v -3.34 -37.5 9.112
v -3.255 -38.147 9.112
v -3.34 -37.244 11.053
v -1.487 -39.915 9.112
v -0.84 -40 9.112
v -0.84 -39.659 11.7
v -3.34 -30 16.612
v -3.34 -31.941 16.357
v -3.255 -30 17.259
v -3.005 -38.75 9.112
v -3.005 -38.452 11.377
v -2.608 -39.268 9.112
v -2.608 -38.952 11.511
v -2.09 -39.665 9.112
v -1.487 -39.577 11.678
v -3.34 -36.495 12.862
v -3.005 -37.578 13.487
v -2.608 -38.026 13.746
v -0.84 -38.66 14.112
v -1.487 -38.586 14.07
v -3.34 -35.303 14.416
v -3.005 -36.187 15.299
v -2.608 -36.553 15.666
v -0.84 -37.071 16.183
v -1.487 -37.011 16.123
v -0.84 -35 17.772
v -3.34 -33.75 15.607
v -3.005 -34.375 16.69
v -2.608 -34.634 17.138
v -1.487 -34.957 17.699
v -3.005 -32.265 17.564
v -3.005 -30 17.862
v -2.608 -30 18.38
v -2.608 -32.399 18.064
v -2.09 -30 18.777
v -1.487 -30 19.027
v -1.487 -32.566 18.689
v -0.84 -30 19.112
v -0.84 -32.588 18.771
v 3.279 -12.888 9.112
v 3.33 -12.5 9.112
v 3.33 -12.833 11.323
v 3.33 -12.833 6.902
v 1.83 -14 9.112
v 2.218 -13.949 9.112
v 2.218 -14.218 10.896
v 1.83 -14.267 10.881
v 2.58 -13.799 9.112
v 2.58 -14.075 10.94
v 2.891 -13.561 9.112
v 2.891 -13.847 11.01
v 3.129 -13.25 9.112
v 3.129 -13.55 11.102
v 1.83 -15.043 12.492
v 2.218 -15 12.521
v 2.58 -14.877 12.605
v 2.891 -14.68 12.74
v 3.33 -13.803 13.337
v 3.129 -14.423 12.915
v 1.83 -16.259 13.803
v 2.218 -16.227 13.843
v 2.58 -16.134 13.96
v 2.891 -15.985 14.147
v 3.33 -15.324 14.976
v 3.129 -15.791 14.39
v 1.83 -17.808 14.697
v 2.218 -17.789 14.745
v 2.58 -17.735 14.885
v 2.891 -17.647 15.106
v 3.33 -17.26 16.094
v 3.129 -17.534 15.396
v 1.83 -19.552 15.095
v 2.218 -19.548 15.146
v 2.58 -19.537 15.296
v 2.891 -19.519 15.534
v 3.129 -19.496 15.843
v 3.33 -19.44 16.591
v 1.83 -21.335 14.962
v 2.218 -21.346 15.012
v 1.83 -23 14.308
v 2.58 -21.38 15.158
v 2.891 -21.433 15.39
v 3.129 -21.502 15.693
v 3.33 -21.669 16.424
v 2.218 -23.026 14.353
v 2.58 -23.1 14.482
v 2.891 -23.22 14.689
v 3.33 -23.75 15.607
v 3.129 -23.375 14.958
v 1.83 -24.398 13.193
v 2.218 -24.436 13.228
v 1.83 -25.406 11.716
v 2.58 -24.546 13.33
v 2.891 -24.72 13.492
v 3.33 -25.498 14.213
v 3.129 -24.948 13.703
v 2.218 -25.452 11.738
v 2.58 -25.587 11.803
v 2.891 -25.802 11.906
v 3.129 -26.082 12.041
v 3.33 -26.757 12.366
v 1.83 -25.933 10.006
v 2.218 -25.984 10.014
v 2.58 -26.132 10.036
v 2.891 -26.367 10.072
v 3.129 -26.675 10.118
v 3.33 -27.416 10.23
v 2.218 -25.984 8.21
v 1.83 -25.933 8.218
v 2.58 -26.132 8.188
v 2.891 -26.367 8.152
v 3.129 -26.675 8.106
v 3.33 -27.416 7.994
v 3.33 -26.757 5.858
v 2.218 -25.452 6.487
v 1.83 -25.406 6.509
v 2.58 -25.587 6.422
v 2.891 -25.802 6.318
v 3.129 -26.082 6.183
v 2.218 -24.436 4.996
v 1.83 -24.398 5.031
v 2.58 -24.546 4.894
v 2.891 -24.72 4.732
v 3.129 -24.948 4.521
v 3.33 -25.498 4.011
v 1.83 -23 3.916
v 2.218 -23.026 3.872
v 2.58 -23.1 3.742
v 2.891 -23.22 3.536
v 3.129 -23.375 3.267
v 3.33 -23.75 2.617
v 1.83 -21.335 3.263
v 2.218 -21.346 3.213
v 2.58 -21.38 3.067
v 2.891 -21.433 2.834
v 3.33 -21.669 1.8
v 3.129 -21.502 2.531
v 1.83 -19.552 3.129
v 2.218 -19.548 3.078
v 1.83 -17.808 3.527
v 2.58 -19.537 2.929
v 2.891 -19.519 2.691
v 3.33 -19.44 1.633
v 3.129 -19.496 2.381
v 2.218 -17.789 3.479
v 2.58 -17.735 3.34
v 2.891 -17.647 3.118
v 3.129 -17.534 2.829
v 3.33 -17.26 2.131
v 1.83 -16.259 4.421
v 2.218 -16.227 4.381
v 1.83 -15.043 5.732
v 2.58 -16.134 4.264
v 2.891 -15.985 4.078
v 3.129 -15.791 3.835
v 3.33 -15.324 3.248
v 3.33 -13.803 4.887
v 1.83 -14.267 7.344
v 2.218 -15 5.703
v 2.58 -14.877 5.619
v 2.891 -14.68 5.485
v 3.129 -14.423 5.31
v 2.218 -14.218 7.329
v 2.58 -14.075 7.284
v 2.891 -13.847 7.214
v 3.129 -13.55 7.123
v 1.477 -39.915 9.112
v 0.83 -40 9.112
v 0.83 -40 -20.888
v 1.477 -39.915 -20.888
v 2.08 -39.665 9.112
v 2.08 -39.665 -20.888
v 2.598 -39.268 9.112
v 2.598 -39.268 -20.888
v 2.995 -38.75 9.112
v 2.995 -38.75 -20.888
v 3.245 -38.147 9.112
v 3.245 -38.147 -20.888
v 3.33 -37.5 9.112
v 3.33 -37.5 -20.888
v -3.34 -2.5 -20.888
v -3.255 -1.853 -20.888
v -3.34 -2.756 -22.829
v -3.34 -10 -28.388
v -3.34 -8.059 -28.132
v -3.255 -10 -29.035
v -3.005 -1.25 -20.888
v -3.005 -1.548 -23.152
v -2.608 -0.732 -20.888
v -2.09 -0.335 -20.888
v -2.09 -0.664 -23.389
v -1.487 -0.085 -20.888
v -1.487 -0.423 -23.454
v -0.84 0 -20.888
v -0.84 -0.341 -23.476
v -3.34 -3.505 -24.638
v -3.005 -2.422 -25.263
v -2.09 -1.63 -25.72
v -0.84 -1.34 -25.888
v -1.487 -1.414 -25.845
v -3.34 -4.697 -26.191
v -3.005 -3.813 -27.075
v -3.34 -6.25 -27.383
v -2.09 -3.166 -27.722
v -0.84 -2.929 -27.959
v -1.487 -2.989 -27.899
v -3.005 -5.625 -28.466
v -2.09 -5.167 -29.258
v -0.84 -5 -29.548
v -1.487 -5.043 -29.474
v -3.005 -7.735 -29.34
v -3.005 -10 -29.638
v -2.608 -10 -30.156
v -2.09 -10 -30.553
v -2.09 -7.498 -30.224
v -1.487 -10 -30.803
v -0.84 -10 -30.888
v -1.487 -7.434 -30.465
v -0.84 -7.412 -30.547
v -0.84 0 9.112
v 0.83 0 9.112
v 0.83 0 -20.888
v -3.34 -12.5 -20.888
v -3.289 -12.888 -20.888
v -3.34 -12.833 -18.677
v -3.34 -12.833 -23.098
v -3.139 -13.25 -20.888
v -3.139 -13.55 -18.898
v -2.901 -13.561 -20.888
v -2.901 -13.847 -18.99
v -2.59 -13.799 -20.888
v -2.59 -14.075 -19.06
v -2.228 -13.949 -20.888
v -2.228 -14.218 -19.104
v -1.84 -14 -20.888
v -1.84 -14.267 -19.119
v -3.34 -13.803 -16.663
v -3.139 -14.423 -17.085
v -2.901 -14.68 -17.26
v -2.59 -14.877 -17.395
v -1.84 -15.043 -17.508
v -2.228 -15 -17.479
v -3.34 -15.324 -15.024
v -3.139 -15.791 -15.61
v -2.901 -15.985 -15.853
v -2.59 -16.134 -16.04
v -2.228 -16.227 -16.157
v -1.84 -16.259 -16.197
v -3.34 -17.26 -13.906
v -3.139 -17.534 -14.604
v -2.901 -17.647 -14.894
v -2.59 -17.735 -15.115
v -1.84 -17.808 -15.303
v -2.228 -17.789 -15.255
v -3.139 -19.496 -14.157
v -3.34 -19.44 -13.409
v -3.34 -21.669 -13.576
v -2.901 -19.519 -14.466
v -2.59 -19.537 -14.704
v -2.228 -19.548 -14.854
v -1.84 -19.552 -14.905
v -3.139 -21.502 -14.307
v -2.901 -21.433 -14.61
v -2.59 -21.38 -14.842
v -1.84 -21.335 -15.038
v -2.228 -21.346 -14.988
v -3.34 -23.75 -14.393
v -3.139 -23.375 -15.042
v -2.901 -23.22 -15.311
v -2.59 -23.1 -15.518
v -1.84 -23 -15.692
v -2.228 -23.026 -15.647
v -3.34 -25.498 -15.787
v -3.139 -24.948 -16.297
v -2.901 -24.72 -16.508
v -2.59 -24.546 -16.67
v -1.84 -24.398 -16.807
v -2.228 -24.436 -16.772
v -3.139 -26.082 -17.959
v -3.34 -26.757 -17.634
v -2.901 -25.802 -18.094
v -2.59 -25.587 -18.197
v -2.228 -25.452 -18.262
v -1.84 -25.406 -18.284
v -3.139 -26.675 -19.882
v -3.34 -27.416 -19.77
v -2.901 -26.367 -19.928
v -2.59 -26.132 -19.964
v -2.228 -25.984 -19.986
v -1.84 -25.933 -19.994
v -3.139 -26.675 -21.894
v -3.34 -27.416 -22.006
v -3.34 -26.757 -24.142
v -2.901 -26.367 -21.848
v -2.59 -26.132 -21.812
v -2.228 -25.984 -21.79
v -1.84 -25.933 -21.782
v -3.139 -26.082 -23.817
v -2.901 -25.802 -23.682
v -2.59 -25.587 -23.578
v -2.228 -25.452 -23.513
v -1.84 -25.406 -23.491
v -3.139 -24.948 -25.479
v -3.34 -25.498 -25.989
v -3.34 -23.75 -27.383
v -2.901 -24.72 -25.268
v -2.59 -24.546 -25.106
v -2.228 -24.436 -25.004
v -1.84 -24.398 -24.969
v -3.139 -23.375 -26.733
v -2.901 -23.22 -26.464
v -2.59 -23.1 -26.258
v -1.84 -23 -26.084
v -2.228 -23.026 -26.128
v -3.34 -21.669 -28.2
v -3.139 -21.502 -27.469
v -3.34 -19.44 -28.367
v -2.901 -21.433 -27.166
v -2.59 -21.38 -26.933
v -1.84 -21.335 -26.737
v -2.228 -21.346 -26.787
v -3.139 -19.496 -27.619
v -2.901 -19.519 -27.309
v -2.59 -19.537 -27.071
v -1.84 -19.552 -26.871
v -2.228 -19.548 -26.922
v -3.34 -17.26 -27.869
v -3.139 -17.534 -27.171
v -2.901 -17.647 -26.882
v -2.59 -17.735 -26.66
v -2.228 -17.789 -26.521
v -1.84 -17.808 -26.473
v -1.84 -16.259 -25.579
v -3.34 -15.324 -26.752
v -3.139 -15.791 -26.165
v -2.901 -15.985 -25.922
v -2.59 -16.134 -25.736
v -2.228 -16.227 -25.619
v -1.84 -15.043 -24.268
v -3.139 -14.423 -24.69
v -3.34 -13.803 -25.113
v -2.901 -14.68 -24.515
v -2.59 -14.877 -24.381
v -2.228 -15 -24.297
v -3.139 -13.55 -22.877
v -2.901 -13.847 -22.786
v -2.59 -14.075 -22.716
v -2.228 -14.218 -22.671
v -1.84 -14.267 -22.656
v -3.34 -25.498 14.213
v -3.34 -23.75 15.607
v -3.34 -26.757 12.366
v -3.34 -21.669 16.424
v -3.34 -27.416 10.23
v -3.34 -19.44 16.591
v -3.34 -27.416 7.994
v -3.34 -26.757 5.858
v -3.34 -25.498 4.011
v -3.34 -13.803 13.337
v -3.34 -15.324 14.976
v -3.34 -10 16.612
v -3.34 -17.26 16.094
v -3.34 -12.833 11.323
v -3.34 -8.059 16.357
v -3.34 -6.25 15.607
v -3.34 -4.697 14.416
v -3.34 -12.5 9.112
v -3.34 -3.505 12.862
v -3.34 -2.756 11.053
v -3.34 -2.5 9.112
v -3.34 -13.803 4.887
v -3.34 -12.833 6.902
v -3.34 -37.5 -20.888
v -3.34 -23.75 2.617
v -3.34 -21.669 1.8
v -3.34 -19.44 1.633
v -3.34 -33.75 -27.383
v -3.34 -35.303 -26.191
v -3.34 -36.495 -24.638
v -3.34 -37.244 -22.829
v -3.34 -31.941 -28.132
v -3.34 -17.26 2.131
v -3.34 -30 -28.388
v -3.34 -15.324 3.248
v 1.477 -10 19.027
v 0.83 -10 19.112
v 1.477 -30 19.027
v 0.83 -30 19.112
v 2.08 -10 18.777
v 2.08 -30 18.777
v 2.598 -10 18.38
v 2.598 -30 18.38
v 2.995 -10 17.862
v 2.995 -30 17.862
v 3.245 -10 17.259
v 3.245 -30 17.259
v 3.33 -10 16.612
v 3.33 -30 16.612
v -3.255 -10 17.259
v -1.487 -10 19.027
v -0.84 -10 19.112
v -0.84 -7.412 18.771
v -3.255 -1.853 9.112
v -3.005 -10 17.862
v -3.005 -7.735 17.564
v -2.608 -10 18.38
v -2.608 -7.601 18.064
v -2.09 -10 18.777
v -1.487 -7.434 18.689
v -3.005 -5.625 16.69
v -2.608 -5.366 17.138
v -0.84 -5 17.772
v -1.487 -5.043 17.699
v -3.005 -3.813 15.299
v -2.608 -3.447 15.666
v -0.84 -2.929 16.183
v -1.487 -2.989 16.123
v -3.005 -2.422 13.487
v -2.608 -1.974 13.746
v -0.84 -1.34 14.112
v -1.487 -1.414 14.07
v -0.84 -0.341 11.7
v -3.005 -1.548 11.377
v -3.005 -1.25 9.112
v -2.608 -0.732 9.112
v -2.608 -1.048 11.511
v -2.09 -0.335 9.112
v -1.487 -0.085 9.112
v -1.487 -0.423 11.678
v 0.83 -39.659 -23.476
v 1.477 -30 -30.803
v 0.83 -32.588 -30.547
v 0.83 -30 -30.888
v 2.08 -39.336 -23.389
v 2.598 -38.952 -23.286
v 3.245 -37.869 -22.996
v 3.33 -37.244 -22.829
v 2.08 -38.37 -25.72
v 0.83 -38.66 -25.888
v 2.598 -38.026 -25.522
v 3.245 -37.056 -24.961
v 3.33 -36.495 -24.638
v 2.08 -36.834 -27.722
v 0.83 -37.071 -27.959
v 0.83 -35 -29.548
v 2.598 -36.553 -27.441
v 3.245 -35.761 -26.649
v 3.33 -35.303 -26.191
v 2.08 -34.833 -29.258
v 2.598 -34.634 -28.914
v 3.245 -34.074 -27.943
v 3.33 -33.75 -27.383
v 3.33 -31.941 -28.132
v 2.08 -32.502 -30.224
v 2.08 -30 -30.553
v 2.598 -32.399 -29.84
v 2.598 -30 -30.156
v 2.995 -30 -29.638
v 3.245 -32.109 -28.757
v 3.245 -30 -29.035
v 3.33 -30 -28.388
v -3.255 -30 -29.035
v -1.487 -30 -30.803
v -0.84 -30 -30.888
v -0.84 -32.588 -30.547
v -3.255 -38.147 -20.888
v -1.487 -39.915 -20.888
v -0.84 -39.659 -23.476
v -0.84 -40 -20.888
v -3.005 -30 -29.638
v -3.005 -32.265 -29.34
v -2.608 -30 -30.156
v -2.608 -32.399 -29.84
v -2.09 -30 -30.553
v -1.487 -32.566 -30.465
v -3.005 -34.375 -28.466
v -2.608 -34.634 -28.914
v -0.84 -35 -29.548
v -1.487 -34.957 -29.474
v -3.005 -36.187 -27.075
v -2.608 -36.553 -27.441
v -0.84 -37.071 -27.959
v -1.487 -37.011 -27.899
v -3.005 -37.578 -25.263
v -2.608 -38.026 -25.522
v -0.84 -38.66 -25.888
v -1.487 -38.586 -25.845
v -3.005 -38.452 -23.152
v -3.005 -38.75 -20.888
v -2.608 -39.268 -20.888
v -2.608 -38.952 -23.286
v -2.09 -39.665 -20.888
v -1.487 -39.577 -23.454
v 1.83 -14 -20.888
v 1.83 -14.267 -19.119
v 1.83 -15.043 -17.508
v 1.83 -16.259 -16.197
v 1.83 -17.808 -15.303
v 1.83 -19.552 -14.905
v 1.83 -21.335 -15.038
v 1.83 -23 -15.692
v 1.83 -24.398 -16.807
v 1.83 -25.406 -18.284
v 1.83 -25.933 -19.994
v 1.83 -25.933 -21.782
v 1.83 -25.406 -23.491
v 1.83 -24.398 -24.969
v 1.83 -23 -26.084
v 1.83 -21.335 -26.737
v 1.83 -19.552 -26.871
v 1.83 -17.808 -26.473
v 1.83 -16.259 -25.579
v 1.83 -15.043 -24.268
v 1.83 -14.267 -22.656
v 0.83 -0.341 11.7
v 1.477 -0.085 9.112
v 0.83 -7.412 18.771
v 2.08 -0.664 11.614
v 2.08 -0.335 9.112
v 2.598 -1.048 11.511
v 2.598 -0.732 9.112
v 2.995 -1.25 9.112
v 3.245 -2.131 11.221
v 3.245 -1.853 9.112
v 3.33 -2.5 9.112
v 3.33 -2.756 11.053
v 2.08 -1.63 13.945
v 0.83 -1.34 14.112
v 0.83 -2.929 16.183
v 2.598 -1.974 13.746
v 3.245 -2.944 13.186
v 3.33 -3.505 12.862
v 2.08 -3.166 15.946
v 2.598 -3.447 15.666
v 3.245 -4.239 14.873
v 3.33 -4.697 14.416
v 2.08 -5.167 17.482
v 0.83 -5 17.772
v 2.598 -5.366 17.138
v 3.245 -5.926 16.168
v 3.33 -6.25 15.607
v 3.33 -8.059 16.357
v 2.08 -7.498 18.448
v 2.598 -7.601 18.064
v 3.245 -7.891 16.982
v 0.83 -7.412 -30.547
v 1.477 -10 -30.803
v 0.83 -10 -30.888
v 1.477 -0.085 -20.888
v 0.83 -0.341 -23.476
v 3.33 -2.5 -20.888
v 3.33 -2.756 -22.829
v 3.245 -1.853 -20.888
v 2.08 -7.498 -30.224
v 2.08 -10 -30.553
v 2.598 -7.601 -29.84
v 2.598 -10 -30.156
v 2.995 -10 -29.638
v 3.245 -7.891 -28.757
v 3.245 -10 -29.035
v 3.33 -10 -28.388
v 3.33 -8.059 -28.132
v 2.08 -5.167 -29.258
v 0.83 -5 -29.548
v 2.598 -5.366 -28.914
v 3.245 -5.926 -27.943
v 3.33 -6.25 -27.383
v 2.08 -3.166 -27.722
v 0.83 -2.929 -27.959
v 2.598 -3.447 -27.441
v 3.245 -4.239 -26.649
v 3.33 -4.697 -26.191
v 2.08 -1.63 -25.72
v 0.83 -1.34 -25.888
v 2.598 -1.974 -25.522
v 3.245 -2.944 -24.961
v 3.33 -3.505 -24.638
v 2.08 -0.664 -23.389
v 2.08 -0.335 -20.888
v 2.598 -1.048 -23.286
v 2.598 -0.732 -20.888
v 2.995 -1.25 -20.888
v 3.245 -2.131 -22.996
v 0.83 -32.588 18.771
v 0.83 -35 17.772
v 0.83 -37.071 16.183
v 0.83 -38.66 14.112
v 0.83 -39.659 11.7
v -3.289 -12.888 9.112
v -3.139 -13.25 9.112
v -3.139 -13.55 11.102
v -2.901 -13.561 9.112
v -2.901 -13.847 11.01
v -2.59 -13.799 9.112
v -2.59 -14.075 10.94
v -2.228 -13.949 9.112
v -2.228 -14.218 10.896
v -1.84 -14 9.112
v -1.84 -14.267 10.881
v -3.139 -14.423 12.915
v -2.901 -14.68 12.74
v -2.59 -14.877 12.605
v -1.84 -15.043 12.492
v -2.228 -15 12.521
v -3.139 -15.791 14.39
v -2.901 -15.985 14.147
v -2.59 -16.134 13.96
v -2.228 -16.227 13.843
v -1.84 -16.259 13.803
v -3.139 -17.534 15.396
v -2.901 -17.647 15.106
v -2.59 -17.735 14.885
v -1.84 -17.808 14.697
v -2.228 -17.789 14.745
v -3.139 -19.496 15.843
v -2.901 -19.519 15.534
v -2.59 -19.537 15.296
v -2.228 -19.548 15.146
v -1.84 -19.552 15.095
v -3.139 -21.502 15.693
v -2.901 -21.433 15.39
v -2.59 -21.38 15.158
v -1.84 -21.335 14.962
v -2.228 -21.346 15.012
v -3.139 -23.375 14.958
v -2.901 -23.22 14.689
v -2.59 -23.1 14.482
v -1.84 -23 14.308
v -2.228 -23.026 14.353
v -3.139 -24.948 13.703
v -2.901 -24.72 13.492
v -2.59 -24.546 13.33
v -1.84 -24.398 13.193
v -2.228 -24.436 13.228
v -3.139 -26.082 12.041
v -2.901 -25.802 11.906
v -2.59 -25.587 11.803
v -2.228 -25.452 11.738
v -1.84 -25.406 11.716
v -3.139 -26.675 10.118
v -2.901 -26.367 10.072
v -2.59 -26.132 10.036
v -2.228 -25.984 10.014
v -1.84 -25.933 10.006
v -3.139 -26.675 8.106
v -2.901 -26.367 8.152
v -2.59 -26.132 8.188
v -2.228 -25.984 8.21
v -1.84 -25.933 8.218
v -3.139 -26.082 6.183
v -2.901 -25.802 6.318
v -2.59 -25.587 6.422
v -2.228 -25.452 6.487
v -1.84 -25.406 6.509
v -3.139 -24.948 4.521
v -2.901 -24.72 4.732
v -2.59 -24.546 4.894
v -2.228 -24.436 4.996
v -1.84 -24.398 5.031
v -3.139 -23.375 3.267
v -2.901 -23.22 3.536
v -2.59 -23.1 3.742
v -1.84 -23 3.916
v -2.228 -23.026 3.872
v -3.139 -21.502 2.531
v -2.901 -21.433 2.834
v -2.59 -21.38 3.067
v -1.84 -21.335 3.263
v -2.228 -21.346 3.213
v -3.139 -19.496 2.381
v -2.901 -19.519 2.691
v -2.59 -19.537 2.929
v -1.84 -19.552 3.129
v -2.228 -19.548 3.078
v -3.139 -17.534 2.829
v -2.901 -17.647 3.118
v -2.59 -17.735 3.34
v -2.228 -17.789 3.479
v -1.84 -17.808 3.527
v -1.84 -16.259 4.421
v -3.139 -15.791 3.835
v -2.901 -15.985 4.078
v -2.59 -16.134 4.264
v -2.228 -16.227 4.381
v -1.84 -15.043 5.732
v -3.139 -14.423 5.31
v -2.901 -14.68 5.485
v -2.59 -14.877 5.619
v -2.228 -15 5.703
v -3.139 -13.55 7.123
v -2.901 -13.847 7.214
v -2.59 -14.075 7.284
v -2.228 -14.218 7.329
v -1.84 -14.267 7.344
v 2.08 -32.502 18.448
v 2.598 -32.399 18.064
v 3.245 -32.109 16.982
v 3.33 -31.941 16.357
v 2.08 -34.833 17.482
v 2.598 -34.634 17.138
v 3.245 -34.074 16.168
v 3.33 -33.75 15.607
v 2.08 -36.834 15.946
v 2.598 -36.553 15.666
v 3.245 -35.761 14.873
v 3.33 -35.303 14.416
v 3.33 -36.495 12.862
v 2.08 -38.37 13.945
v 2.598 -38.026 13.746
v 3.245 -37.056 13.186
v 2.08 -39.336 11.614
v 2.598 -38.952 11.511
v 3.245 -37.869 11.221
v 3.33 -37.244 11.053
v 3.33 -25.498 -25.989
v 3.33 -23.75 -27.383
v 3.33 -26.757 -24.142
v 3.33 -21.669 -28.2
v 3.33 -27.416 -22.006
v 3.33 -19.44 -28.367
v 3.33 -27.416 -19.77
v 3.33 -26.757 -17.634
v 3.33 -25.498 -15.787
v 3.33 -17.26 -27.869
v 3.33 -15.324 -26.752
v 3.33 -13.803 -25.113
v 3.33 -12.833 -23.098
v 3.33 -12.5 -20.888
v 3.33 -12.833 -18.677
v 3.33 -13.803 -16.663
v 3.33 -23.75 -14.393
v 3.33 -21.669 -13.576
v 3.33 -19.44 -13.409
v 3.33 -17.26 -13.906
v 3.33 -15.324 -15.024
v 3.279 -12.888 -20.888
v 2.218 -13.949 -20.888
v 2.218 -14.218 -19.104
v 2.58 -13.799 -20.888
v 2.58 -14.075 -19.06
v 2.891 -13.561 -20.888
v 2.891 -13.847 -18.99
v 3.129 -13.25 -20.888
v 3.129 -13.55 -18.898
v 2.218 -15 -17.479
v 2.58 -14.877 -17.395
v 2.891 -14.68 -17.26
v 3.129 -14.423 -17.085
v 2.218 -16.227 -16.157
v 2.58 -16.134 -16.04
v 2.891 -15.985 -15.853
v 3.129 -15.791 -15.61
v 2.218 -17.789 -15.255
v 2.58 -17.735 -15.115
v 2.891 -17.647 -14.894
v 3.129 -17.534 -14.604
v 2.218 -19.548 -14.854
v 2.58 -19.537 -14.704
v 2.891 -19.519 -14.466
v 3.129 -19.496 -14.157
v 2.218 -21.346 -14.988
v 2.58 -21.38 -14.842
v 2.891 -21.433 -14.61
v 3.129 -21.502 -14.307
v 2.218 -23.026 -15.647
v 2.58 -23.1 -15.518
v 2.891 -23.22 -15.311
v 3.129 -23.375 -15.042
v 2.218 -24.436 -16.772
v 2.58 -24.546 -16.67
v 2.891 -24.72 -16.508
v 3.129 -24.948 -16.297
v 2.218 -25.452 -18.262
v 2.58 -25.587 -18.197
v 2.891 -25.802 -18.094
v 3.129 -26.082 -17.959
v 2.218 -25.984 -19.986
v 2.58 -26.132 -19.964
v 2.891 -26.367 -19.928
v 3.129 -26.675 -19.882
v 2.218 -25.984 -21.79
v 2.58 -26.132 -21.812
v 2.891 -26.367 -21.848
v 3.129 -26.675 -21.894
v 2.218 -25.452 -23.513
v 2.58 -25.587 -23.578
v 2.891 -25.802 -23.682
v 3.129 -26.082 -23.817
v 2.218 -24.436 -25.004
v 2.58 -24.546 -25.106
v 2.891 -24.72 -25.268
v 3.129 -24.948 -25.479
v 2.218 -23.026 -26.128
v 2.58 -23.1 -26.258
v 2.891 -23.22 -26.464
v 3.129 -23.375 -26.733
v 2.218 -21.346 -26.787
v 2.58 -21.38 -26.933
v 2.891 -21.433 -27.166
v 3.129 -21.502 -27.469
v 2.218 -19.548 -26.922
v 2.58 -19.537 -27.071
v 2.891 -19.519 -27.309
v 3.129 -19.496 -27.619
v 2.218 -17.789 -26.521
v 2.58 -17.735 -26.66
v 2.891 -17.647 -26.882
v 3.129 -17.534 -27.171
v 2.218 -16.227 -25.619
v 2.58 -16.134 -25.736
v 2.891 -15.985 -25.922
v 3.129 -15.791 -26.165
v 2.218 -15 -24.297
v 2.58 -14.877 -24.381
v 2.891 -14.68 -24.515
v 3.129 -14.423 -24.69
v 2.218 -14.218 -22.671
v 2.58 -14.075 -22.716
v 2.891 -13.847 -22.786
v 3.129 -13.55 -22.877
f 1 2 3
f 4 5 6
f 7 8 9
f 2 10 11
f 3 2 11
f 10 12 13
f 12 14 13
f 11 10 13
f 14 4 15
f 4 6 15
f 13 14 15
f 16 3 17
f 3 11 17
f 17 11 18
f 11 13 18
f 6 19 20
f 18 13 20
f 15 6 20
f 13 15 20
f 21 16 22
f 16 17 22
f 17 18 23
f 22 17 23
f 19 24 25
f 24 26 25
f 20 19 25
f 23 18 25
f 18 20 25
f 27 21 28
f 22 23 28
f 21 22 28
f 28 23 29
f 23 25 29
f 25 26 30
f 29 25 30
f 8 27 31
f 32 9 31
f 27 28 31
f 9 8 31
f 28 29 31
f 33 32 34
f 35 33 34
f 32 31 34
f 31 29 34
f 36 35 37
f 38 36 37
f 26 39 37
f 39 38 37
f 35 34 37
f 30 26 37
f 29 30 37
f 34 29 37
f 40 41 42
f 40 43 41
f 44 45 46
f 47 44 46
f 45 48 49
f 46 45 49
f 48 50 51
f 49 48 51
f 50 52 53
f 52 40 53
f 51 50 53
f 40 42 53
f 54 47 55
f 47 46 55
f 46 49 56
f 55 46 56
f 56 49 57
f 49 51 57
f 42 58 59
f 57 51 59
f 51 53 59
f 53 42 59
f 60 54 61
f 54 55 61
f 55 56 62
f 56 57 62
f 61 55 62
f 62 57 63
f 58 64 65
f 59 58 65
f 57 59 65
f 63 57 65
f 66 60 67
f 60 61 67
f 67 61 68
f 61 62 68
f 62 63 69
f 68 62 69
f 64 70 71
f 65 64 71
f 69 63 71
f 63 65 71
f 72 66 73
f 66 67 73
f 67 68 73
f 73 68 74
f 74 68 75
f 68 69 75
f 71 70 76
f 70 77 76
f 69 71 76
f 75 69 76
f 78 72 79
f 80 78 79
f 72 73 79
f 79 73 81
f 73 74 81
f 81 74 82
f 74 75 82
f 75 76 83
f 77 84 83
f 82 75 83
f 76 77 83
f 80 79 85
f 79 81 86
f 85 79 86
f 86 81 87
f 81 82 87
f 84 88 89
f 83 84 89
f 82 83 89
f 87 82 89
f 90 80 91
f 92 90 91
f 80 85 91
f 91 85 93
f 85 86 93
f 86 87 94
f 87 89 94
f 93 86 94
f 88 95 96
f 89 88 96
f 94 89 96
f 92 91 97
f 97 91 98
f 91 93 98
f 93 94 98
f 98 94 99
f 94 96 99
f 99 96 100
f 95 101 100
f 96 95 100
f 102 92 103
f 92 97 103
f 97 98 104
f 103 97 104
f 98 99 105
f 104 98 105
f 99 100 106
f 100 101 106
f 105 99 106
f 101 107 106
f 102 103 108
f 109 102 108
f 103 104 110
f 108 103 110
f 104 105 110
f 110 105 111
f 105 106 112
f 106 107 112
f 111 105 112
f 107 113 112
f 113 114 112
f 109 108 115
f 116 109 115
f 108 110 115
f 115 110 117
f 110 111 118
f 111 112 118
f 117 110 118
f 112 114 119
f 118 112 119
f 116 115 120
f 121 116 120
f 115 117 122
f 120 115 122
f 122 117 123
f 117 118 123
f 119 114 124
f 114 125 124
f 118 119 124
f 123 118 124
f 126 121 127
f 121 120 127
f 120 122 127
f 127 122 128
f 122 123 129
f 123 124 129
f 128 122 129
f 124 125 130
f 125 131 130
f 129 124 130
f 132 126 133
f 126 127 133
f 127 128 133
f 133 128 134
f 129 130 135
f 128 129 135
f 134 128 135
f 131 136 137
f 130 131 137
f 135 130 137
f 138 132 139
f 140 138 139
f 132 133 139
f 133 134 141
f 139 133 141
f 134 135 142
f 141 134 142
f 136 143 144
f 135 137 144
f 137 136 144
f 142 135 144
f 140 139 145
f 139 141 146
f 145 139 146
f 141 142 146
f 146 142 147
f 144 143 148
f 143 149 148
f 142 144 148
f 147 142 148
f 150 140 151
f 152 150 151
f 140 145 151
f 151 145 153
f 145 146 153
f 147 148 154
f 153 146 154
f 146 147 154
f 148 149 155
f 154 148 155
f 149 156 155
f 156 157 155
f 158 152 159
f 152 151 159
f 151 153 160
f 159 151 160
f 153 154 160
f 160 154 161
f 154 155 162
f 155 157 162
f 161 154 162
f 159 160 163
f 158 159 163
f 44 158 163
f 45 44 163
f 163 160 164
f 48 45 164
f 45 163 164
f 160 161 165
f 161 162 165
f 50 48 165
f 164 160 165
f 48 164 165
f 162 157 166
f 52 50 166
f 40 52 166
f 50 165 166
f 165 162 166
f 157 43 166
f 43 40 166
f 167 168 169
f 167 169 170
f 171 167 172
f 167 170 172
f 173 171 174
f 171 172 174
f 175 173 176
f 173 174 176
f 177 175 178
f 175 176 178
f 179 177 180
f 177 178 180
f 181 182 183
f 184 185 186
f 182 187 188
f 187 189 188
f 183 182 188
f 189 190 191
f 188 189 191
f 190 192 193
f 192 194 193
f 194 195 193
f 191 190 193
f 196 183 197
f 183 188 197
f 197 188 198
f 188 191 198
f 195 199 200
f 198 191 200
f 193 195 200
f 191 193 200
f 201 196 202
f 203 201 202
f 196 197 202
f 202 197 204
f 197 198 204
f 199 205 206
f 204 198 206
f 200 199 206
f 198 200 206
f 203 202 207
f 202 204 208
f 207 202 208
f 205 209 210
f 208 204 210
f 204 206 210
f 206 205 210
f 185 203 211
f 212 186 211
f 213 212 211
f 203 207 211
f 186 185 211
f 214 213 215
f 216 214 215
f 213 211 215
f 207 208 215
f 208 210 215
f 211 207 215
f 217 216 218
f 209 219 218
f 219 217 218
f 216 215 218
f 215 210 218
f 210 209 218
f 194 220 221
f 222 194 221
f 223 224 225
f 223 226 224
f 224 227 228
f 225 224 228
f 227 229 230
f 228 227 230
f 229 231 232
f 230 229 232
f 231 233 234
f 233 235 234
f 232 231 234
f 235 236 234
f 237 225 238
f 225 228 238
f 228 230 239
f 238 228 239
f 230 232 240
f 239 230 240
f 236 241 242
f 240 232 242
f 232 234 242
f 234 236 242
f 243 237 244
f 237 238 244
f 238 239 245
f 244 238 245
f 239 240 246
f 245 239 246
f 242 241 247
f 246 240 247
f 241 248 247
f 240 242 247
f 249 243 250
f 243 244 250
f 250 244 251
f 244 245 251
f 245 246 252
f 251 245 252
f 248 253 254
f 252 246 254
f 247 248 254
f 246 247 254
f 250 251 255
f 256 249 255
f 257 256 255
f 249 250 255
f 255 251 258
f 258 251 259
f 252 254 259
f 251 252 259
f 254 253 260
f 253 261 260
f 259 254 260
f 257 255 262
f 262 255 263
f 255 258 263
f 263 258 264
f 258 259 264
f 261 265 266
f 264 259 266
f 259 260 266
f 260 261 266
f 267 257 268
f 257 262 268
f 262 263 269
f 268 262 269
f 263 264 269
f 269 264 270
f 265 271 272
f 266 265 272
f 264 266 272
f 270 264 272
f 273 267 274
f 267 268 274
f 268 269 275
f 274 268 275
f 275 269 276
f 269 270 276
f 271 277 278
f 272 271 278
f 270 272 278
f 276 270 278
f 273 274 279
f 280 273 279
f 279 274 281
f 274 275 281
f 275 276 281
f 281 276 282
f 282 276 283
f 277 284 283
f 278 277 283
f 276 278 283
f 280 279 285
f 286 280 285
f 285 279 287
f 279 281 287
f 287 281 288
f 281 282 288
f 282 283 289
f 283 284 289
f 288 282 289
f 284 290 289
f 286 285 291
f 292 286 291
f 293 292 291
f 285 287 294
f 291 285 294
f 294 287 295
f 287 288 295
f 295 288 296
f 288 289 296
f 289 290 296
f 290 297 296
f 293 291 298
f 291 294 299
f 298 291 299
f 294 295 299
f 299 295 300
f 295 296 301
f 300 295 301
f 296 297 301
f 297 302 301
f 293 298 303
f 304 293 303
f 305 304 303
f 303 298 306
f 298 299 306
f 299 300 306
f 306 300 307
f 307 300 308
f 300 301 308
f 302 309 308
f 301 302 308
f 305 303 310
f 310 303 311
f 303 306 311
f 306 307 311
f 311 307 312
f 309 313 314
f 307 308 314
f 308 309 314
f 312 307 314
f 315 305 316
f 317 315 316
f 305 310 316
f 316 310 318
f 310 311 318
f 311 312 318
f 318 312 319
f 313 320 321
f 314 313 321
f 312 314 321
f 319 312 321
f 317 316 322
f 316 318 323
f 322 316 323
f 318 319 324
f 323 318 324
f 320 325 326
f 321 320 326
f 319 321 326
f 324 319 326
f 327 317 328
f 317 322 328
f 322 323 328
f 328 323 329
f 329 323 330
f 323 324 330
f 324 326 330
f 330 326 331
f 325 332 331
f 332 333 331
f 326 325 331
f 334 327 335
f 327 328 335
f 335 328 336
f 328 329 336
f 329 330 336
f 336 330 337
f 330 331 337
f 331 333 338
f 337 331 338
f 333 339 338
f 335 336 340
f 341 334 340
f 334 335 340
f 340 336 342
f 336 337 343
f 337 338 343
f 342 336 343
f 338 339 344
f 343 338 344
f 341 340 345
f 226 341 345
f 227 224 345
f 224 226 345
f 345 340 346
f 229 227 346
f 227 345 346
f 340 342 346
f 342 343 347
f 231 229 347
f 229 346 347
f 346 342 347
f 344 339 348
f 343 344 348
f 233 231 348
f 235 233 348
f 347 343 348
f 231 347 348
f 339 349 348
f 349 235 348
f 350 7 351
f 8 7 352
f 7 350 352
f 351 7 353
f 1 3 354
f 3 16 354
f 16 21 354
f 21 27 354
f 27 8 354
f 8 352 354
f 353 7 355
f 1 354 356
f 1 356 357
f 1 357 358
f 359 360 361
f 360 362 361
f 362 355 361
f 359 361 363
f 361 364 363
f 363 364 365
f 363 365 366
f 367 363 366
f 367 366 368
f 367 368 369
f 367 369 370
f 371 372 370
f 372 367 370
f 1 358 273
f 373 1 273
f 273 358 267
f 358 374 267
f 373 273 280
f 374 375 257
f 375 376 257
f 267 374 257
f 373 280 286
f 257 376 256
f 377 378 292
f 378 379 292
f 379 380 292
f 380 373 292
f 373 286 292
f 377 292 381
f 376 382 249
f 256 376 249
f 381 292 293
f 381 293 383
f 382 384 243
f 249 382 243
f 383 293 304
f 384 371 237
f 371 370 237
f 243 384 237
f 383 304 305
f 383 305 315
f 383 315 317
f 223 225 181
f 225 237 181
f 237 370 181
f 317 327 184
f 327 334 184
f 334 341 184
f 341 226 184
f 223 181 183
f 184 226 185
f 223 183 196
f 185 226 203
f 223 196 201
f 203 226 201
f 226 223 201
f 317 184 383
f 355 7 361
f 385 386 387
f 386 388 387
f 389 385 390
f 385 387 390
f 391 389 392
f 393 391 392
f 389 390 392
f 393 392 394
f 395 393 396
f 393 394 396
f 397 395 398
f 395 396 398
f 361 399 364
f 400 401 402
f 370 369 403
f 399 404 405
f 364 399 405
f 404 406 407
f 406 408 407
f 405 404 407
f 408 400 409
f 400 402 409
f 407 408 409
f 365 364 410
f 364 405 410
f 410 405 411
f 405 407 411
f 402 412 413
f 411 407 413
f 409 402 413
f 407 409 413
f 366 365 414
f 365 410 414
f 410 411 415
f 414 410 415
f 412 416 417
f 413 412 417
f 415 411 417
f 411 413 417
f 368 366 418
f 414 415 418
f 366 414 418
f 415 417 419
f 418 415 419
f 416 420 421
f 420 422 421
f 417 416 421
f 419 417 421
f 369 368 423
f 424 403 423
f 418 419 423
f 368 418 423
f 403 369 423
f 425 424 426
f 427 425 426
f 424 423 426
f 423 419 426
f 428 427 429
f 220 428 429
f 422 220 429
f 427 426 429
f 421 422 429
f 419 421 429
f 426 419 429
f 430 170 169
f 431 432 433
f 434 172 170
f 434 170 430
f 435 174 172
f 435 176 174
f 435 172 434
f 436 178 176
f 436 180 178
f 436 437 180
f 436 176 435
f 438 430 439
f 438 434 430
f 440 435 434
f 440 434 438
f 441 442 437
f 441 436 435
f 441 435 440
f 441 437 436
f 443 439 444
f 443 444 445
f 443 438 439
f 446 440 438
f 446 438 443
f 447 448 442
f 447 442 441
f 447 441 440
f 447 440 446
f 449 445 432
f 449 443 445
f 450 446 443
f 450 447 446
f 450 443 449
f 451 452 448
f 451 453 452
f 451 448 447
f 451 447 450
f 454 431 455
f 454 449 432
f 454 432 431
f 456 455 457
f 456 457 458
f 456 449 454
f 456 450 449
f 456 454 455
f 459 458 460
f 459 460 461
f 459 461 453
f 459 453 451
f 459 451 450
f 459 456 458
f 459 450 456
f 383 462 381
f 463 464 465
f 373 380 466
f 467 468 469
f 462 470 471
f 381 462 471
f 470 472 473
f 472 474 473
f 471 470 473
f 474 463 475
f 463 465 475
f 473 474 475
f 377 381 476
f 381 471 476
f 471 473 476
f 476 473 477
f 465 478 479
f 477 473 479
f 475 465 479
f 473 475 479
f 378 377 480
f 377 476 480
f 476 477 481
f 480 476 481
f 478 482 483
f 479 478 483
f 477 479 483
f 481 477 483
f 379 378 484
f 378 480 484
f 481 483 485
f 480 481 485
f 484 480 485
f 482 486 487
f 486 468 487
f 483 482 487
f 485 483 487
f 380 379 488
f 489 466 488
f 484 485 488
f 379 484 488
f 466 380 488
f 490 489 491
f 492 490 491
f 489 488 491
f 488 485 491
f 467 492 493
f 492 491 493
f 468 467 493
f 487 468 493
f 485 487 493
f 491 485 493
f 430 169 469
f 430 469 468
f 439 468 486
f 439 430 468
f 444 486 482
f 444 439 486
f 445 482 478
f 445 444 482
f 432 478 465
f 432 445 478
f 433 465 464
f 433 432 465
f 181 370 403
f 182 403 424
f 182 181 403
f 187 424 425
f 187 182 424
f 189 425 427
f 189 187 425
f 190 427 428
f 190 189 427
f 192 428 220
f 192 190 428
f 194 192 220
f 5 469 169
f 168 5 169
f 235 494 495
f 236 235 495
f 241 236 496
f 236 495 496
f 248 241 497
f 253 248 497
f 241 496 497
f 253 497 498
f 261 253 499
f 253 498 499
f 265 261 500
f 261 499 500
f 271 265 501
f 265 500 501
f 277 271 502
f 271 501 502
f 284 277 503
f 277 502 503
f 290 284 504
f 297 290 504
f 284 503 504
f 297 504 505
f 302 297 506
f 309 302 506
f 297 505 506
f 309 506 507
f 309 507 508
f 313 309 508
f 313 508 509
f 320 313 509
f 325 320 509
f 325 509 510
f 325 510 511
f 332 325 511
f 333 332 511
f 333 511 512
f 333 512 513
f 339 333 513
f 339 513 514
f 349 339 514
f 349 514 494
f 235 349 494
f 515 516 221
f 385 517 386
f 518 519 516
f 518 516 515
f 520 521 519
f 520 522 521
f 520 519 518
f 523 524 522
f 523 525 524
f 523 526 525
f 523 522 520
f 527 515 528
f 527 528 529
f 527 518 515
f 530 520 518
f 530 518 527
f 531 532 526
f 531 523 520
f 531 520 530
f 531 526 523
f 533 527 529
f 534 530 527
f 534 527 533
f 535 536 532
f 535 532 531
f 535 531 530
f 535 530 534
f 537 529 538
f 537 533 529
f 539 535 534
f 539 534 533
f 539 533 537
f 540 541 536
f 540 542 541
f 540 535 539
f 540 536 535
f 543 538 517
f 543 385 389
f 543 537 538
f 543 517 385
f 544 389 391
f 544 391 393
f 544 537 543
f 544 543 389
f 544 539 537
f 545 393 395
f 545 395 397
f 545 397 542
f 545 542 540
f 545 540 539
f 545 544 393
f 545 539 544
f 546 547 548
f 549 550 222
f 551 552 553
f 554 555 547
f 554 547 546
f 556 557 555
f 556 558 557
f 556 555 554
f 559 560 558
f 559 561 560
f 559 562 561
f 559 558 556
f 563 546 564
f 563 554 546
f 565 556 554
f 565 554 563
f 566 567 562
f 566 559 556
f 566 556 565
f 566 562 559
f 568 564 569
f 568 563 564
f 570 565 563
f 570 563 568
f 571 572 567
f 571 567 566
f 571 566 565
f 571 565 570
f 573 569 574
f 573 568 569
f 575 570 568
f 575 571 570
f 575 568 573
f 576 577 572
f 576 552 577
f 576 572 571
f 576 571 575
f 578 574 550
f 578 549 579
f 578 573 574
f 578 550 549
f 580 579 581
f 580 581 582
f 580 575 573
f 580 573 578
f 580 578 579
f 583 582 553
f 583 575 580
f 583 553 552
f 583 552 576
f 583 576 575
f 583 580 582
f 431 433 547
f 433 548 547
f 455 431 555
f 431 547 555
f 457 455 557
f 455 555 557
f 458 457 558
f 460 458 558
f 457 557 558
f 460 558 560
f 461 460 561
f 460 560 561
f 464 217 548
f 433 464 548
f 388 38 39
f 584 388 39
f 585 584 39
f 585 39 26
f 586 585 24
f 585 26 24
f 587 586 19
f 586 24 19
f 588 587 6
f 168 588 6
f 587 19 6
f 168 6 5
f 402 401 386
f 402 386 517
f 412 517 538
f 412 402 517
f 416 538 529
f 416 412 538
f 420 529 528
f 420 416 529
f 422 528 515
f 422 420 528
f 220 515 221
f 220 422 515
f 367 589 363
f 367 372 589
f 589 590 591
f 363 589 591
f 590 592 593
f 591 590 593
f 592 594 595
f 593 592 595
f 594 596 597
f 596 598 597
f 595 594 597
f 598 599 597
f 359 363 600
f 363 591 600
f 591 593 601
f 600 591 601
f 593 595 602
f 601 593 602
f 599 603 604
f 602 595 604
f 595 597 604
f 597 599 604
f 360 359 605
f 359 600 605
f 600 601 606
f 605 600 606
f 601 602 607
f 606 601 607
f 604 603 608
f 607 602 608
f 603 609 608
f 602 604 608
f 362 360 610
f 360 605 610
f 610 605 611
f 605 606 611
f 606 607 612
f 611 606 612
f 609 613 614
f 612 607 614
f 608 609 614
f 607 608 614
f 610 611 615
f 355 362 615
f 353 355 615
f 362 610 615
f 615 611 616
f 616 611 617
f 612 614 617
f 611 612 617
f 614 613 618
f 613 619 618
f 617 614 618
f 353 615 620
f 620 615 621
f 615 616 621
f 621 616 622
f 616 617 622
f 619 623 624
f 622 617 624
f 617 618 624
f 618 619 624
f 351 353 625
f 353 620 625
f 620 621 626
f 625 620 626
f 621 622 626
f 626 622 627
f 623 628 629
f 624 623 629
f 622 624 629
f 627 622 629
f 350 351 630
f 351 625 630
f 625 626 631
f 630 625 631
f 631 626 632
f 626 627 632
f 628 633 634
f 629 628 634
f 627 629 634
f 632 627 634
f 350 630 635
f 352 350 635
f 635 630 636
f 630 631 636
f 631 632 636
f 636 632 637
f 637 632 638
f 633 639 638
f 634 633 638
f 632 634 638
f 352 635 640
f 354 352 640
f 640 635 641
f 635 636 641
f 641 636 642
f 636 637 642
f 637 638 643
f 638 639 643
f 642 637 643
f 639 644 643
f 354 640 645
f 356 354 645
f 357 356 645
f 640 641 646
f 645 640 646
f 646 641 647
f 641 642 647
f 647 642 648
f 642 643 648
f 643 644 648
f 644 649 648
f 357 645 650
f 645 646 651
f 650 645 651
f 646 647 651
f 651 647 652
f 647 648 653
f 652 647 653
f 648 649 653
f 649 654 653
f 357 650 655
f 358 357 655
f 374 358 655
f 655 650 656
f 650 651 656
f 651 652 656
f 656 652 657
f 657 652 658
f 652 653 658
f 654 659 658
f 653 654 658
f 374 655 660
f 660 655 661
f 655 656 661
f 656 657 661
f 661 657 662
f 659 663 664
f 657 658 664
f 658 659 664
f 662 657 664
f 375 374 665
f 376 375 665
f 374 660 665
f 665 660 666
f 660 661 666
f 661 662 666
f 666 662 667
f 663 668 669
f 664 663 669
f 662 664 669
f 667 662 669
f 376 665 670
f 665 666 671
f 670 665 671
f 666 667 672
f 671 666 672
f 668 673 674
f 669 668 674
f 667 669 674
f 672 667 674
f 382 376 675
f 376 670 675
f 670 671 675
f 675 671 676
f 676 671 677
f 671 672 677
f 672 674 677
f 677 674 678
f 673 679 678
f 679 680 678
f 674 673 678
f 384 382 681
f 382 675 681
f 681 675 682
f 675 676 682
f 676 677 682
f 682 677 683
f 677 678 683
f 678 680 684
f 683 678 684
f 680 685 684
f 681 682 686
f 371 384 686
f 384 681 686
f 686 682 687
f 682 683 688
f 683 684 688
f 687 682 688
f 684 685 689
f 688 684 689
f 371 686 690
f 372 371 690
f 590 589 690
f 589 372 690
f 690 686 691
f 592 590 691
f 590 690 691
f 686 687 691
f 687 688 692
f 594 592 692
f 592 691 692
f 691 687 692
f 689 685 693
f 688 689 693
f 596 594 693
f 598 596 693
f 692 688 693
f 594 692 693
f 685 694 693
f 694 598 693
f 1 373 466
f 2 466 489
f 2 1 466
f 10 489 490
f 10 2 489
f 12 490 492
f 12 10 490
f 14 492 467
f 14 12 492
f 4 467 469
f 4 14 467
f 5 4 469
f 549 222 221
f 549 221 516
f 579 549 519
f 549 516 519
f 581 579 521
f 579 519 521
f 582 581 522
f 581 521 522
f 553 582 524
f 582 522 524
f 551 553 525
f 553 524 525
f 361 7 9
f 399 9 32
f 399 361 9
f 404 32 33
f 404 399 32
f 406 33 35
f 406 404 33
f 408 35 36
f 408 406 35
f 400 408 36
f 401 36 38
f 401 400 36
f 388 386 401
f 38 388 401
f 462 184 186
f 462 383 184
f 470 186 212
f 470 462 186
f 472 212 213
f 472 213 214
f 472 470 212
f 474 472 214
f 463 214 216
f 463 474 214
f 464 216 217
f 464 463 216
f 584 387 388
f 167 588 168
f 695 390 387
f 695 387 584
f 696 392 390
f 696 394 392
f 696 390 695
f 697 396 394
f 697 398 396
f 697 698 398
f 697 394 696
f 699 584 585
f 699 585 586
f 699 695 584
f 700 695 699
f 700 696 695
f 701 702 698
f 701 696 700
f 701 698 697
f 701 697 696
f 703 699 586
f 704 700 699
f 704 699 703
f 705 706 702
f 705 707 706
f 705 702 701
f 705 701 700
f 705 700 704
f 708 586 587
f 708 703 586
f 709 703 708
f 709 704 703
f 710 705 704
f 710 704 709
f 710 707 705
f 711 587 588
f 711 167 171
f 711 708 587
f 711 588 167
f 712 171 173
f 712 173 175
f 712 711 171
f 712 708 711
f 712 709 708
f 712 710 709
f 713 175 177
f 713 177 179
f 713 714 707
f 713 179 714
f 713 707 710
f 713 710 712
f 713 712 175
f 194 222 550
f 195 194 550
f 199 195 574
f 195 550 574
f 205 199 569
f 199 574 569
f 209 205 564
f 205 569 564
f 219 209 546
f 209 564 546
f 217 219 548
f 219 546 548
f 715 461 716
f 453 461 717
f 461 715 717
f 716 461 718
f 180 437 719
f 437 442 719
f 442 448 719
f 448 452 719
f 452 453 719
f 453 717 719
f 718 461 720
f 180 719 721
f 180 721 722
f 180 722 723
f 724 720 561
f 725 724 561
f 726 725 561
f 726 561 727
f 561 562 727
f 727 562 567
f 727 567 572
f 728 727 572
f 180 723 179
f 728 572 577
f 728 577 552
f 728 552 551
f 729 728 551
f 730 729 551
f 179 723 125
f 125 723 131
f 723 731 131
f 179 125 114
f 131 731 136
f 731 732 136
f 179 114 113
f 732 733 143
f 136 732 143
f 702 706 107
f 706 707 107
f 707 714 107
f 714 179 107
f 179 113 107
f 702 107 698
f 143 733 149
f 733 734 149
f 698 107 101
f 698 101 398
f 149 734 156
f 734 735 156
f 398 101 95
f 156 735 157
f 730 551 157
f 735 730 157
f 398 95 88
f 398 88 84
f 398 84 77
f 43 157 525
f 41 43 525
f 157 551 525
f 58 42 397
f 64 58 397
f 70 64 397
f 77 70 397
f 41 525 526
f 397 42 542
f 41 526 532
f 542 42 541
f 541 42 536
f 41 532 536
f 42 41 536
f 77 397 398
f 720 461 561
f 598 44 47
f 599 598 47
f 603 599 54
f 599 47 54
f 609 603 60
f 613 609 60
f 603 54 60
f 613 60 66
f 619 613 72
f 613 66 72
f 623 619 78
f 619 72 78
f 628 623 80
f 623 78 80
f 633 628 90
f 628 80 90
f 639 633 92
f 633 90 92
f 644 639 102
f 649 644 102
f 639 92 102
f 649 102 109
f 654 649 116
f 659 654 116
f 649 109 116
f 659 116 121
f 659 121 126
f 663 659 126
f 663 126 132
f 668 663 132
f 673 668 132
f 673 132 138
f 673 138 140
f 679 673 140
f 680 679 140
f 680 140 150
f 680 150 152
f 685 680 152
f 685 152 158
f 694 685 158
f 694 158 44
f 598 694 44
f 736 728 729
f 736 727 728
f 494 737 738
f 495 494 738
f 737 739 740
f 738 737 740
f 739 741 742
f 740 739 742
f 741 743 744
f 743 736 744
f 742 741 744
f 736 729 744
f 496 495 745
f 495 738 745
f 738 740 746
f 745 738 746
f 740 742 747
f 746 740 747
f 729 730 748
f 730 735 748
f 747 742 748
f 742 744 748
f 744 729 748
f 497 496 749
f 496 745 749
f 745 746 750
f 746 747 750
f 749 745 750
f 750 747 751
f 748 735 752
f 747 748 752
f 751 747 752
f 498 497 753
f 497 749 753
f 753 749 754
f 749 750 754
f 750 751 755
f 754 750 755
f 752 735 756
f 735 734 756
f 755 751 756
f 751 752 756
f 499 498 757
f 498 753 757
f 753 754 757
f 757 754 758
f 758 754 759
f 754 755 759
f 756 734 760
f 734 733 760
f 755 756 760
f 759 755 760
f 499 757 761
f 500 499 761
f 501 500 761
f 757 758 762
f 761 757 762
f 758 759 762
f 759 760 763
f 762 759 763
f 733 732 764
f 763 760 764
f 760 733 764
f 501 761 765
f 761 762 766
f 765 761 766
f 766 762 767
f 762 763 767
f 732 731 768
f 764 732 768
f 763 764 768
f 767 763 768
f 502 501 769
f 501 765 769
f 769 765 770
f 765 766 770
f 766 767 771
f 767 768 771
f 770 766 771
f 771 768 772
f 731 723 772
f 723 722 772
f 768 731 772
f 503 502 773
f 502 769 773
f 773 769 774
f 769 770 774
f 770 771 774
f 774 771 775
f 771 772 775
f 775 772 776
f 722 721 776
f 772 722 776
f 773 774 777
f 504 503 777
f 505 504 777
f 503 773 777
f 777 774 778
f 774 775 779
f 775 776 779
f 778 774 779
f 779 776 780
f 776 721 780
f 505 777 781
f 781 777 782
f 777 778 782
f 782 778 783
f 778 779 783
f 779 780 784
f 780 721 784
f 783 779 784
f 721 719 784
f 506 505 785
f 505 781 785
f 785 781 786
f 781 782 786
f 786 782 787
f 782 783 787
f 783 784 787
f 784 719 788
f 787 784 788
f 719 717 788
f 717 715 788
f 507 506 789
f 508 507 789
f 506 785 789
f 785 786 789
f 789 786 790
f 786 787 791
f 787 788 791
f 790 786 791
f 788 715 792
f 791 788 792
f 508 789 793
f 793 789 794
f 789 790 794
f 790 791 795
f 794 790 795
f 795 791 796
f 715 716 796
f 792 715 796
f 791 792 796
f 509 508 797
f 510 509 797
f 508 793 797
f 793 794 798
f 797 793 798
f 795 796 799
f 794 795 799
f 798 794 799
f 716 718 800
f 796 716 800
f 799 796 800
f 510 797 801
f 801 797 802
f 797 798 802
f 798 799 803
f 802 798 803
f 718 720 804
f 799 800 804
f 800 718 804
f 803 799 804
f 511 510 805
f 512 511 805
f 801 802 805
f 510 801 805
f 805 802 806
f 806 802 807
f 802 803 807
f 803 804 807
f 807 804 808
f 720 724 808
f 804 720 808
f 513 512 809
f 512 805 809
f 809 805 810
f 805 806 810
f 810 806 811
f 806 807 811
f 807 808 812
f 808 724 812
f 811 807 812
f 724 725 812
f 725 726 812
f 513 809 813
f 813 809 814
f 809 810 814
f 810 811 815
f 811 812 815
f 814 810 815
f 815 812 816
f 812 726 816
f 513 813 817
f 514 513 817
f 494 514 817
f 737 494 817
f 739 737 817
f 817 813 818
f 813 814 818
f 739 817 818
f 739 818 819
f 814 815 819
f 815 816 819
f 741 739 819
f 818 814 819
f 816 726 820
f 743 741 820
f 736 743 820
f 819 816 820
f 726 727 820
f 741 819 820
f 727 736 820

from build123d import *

# Parameters (mm, degrees)
F1_DEPTH = 40
F2_R     = 6
F3_DEPTH = 25
F4_R     = 10
F5_R     = 2.5
F6_R     = 1.49999


# Not quite as in the source:
# - a fillet or chamfer is up to 0.001 mm smaller than in the source, because OpenCascade refuses the exact size
# - a feature names something its author has since deleted; it is built from what else it names


with BuildPart() as f1:
    # F0 (on Front) → F1 (new body)
    with BuildSketch(Plane.XZ):
        Polygon((-3.34, 19.1122043878), (-3.34, -0.8877956122), (-3.34, -30.8877956122), (3.33, -30.8877956122), (3.33, -0.8877956122), (3.33, 13.6661529541), (3.33, 19.1122043878), align=None)
    extrude(amount=F1_DEPTH)

    # F2 (on face) → F3 (cut)
    with BuildSketch(Plane.YZ.offset(3.33)):
        with Locations((-20, 9.1122043878)):
            Circle(F2_R)
        with Locations((-20, -20.8877956122)):
            Circle(F2_R)
    extrude(amount=-F3_DEPTH, mode=Mode.SUBTRACT)

    # F4
    f4_edges = [f1.edges().sort_by_distance(p)[0] for p in [
        (-0.005, -40, 19.112204),
        (-0.005, 0, 19.112204),
        (-0.005, 0, -30.887796),
        (-0.005, -40, -30.887796),
    ]]
    fillet(f4_edges, radius=F4_R)

    # F5
    f5_edges = [f1.edges().sort_by_distance(p)[0] for p in [
        (3.33, -20, 19.112204),
        (-3.34, -20, -30.887796),
        (-3.34, -20, 19.112204),
        (-3.34, -37.071068, 16.183272),
        (-3.34, -40, -5.887796),
        (-3.34, -37.071068, -27.958863),
        (-3.34, -2.928932, -27.958863),
        (-3.34, -2.928932, 16.183272),
        (-3.34, 0, -5.887796),
    ]]
    fillet(f5_edges, radius=F5_R)

    # F6 (radius 1.5 in the source; OpenCascade refuses exactly that, so slightly less here)
    f6_edges = [f1.edges().sort_by_distance(p)[0] for p in [
        (3.33, -26, 9.112204),
        (-0.005, -14, 9.112204),
        (-3.34, -26, 9.112204),
        (3.33, -26, -20.887796),
        (-3.34, -26, -20.887796),
    ]]
    fillet(f6_edges, radius=F6_R)


solid = f1.part
